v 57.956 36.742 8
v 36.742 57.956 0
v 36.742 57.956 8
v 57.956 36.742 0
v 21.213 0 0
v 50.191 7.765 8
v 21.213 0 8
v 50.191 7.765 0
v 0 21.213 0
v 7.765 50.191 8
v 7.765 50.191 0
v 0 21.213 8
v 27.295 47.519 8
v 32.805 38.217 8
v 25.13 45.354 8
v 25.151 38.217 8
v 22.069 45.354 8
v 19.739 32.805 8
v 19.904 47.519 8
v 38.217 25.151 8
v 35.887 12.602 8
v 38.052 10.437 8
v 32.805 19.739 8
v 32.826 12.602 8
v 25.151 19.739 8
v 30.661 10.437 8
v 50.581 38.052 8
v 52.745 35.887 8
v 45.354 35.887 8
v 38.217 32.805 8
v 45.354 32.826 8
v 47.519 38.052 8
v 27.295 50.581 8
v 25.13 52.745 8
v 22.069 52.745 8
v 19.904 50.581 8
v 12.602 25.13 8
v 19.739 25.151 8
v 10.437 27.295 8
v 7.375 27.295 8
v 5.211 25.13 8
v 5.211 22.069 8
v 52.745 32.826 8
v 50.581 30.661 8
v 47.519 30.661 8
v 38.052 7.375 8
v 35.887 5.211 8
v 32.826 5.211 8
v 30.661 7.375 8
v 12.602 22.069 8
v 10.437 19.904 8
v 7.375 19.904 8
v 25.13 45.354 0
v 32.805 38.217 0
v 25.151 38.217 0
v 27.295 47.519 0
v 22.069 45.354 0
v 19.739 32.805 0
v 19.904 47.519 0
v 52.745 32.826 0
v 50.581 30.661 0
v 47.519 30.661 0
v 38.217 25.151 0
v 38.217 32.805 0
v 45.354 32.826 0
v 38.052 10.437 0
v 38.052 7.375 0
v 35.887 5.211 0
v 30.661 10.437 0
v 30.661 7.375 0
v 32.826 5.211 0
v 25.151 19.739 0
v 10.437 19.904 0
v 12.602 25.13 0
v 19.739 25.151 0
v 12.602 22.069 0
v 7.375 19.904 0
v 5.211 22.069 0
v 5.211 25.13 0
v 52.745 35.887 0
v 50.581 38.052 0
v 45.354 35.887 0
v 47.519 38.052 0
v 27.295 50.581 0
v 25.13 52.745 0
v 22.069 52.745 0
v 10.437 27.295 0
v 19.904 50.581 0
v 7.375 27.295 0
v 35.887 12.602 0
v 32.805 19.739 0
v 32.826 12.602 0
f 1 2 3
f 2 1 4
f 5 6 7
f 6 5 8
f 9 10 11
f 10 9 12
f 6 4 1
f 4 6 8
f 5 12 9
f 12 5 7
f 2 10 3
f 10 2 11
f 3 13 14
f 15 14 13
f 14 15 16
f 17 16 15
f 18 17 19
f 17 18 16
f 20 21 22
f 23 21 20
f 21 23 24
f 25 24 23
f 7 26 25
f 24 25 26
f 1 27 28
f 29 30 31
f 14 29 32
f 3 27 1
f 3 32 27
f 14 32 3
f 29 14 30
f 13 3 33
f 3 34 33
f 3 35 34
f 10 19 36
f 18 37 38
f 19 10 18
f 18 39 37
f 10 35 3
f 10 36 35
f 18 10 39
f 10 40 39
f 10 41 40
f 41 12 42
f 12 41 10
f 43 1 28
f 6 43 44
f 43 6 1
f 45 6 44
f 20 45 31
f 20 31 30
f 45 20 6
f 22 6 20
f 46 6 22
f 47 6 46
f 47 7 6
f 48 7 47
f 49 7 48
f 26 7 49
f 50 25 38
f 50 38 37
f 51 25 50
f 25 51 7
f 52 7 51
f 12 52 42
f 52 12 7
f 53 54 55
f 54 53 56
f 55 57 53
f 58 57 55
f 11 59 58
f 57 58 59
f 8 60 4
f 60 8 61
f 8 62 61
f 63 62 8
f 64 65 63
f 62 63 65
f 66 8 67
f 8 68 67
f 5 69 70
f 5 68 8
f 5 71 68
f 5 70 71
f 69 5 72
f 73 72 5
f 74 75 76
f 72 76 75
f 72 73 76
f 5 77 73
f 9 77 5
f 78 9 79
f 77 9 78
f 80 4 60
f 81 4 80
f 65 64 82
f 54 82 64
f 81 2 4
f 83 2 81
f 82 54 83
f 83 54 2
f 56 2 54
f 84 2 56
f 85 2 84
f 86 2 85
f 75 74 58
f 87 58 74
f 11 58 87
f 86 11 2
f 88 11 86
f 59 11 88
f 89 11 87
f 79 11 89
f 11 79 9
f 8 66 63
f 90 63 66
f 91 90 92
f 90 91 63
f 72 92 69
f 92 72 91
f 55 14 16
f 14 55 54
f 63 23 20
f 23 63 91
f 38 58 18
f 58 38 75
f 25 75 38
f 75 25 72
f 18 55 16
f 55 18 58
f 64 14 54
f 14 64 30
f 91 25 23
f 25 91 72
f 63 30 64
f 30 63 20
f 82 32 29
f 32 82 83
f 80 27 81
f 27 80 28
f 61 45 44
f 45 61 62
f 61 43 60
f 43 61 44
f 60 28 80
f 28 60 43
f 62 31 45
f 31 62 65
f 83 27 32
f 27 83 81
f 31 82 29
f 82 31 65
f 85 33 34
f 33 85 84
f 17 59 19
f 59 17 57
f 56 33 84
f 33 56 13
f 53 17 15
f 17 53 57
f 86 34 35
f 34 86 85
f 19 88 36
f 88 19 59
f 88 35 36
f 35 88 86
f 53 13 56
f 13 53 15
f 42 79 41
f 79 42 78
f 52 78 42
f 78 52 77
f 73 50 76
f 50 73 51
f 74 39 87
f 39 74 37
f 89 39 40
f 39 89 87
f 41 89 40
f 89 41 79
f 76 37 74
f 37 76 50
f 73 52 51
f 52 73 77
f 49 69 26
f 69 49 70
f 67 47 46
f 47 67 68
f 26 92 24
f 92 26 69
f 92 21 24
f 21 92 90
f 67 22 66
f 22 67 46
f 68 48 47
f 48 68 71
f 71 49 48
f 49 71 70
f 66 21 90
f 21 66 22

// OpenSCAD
$fn = 32;

// ----------------------------------------------------------------------
// Polygon plate: 6-gon R30, 4 bolt windows
// ----------------------------------------------------------------------

// --- parameters (mm) ---
sides = 6;                // number of polygon sides
plate_r = 30;             // circumscribed radius of the polygon
bore_r = 10;              // centre bore radius
bolts = 4;                // number of bolt windows
ring_r = 20.78;           // bolt-circle radius
bolt_r = 4;               // bolt window radius
plate_t = 8;              // plate thickness, Z (extrusion height)

plate_d = 2 * plate_r;  // circumscribed diameter
bore_d = 2 * bore_r;  // centre bore diameter
bolt_d = 2 * bolt_r;  // bolt window diameter
ring_d = 2 * ring_r;  // bolt-circle diameter

profile = [[57.956, 36.742], [36.742, 57.956], [7.765, 50.191], [0, 21.213], [21.213, 0], [50.191, 7.765]];  // primary outline, 6 points, counter clockwise
void_1 = [[38.217, 32.805], [32.805, 38.217], [25.151, 38.217], [19.739, 32.805], [19.739, 25.151], [25.151, 19.739], [32.805, 19.739], [38.217, 25.151]];  // centre bore, 8 points
void_2 = [[52.745, 35.887], [50.581, 38.052], [47.519, 38.052], [45.354, 35.887], [45.354, 32.826], [47.519, 30.661], [50.581, 30.661], [52.745, 32.826]];  // bolt window 1, 8 points
void_3 = [[27.295, 50.581], [25.13, 52.745], [22.069, 52.745], [19.904, 50.581], [19.904, 47.519], [22.069, 45.354], [25.13, 45.354], [27.295, 47.519]];  // bolt window 2, 8 points
void_4 = [[12.602, 25.13], [10.437, 27.295], [7.375, 27.295], [5.211, 25.13], [5.211, 22.069], [7.375, 19.904], [10.437, 19.904], [12.602, 22.069]];  // bolt window 3, 8 points
void_5 = [[38.052, 10.437], [35.887, 12.602], [32.826, 12.602], [30.661, 10.437], [30.661, 7.375], [32.826, 5.211], [35.887, 5.211], [38.052, 7.375]];  // bolt window 4, 8 points

// --- the one profile operation ---
difference() {
  linear_extrude(height = plate_t) polygon(points = profile);
  translate([0, 0, -1])
    linear_extrude(height = plate_t + 2) polygon(points = void_1);
  translate([0, 0, -1])
    linear_extrude(height = plate_t + 2) polygon(points = void_2);
  translate([0, 0, -1])
    linear_extrude(height = plate_t + 2) polygon(points = void_3);
  translate([0, 0, -1])
    linear_extrude(height = plate_t + 2) polygon(points = void_4);
  translate([0, 0, -1])
    linear_extrude(height = plate_t + 2) polygon(points = void_5);
}
